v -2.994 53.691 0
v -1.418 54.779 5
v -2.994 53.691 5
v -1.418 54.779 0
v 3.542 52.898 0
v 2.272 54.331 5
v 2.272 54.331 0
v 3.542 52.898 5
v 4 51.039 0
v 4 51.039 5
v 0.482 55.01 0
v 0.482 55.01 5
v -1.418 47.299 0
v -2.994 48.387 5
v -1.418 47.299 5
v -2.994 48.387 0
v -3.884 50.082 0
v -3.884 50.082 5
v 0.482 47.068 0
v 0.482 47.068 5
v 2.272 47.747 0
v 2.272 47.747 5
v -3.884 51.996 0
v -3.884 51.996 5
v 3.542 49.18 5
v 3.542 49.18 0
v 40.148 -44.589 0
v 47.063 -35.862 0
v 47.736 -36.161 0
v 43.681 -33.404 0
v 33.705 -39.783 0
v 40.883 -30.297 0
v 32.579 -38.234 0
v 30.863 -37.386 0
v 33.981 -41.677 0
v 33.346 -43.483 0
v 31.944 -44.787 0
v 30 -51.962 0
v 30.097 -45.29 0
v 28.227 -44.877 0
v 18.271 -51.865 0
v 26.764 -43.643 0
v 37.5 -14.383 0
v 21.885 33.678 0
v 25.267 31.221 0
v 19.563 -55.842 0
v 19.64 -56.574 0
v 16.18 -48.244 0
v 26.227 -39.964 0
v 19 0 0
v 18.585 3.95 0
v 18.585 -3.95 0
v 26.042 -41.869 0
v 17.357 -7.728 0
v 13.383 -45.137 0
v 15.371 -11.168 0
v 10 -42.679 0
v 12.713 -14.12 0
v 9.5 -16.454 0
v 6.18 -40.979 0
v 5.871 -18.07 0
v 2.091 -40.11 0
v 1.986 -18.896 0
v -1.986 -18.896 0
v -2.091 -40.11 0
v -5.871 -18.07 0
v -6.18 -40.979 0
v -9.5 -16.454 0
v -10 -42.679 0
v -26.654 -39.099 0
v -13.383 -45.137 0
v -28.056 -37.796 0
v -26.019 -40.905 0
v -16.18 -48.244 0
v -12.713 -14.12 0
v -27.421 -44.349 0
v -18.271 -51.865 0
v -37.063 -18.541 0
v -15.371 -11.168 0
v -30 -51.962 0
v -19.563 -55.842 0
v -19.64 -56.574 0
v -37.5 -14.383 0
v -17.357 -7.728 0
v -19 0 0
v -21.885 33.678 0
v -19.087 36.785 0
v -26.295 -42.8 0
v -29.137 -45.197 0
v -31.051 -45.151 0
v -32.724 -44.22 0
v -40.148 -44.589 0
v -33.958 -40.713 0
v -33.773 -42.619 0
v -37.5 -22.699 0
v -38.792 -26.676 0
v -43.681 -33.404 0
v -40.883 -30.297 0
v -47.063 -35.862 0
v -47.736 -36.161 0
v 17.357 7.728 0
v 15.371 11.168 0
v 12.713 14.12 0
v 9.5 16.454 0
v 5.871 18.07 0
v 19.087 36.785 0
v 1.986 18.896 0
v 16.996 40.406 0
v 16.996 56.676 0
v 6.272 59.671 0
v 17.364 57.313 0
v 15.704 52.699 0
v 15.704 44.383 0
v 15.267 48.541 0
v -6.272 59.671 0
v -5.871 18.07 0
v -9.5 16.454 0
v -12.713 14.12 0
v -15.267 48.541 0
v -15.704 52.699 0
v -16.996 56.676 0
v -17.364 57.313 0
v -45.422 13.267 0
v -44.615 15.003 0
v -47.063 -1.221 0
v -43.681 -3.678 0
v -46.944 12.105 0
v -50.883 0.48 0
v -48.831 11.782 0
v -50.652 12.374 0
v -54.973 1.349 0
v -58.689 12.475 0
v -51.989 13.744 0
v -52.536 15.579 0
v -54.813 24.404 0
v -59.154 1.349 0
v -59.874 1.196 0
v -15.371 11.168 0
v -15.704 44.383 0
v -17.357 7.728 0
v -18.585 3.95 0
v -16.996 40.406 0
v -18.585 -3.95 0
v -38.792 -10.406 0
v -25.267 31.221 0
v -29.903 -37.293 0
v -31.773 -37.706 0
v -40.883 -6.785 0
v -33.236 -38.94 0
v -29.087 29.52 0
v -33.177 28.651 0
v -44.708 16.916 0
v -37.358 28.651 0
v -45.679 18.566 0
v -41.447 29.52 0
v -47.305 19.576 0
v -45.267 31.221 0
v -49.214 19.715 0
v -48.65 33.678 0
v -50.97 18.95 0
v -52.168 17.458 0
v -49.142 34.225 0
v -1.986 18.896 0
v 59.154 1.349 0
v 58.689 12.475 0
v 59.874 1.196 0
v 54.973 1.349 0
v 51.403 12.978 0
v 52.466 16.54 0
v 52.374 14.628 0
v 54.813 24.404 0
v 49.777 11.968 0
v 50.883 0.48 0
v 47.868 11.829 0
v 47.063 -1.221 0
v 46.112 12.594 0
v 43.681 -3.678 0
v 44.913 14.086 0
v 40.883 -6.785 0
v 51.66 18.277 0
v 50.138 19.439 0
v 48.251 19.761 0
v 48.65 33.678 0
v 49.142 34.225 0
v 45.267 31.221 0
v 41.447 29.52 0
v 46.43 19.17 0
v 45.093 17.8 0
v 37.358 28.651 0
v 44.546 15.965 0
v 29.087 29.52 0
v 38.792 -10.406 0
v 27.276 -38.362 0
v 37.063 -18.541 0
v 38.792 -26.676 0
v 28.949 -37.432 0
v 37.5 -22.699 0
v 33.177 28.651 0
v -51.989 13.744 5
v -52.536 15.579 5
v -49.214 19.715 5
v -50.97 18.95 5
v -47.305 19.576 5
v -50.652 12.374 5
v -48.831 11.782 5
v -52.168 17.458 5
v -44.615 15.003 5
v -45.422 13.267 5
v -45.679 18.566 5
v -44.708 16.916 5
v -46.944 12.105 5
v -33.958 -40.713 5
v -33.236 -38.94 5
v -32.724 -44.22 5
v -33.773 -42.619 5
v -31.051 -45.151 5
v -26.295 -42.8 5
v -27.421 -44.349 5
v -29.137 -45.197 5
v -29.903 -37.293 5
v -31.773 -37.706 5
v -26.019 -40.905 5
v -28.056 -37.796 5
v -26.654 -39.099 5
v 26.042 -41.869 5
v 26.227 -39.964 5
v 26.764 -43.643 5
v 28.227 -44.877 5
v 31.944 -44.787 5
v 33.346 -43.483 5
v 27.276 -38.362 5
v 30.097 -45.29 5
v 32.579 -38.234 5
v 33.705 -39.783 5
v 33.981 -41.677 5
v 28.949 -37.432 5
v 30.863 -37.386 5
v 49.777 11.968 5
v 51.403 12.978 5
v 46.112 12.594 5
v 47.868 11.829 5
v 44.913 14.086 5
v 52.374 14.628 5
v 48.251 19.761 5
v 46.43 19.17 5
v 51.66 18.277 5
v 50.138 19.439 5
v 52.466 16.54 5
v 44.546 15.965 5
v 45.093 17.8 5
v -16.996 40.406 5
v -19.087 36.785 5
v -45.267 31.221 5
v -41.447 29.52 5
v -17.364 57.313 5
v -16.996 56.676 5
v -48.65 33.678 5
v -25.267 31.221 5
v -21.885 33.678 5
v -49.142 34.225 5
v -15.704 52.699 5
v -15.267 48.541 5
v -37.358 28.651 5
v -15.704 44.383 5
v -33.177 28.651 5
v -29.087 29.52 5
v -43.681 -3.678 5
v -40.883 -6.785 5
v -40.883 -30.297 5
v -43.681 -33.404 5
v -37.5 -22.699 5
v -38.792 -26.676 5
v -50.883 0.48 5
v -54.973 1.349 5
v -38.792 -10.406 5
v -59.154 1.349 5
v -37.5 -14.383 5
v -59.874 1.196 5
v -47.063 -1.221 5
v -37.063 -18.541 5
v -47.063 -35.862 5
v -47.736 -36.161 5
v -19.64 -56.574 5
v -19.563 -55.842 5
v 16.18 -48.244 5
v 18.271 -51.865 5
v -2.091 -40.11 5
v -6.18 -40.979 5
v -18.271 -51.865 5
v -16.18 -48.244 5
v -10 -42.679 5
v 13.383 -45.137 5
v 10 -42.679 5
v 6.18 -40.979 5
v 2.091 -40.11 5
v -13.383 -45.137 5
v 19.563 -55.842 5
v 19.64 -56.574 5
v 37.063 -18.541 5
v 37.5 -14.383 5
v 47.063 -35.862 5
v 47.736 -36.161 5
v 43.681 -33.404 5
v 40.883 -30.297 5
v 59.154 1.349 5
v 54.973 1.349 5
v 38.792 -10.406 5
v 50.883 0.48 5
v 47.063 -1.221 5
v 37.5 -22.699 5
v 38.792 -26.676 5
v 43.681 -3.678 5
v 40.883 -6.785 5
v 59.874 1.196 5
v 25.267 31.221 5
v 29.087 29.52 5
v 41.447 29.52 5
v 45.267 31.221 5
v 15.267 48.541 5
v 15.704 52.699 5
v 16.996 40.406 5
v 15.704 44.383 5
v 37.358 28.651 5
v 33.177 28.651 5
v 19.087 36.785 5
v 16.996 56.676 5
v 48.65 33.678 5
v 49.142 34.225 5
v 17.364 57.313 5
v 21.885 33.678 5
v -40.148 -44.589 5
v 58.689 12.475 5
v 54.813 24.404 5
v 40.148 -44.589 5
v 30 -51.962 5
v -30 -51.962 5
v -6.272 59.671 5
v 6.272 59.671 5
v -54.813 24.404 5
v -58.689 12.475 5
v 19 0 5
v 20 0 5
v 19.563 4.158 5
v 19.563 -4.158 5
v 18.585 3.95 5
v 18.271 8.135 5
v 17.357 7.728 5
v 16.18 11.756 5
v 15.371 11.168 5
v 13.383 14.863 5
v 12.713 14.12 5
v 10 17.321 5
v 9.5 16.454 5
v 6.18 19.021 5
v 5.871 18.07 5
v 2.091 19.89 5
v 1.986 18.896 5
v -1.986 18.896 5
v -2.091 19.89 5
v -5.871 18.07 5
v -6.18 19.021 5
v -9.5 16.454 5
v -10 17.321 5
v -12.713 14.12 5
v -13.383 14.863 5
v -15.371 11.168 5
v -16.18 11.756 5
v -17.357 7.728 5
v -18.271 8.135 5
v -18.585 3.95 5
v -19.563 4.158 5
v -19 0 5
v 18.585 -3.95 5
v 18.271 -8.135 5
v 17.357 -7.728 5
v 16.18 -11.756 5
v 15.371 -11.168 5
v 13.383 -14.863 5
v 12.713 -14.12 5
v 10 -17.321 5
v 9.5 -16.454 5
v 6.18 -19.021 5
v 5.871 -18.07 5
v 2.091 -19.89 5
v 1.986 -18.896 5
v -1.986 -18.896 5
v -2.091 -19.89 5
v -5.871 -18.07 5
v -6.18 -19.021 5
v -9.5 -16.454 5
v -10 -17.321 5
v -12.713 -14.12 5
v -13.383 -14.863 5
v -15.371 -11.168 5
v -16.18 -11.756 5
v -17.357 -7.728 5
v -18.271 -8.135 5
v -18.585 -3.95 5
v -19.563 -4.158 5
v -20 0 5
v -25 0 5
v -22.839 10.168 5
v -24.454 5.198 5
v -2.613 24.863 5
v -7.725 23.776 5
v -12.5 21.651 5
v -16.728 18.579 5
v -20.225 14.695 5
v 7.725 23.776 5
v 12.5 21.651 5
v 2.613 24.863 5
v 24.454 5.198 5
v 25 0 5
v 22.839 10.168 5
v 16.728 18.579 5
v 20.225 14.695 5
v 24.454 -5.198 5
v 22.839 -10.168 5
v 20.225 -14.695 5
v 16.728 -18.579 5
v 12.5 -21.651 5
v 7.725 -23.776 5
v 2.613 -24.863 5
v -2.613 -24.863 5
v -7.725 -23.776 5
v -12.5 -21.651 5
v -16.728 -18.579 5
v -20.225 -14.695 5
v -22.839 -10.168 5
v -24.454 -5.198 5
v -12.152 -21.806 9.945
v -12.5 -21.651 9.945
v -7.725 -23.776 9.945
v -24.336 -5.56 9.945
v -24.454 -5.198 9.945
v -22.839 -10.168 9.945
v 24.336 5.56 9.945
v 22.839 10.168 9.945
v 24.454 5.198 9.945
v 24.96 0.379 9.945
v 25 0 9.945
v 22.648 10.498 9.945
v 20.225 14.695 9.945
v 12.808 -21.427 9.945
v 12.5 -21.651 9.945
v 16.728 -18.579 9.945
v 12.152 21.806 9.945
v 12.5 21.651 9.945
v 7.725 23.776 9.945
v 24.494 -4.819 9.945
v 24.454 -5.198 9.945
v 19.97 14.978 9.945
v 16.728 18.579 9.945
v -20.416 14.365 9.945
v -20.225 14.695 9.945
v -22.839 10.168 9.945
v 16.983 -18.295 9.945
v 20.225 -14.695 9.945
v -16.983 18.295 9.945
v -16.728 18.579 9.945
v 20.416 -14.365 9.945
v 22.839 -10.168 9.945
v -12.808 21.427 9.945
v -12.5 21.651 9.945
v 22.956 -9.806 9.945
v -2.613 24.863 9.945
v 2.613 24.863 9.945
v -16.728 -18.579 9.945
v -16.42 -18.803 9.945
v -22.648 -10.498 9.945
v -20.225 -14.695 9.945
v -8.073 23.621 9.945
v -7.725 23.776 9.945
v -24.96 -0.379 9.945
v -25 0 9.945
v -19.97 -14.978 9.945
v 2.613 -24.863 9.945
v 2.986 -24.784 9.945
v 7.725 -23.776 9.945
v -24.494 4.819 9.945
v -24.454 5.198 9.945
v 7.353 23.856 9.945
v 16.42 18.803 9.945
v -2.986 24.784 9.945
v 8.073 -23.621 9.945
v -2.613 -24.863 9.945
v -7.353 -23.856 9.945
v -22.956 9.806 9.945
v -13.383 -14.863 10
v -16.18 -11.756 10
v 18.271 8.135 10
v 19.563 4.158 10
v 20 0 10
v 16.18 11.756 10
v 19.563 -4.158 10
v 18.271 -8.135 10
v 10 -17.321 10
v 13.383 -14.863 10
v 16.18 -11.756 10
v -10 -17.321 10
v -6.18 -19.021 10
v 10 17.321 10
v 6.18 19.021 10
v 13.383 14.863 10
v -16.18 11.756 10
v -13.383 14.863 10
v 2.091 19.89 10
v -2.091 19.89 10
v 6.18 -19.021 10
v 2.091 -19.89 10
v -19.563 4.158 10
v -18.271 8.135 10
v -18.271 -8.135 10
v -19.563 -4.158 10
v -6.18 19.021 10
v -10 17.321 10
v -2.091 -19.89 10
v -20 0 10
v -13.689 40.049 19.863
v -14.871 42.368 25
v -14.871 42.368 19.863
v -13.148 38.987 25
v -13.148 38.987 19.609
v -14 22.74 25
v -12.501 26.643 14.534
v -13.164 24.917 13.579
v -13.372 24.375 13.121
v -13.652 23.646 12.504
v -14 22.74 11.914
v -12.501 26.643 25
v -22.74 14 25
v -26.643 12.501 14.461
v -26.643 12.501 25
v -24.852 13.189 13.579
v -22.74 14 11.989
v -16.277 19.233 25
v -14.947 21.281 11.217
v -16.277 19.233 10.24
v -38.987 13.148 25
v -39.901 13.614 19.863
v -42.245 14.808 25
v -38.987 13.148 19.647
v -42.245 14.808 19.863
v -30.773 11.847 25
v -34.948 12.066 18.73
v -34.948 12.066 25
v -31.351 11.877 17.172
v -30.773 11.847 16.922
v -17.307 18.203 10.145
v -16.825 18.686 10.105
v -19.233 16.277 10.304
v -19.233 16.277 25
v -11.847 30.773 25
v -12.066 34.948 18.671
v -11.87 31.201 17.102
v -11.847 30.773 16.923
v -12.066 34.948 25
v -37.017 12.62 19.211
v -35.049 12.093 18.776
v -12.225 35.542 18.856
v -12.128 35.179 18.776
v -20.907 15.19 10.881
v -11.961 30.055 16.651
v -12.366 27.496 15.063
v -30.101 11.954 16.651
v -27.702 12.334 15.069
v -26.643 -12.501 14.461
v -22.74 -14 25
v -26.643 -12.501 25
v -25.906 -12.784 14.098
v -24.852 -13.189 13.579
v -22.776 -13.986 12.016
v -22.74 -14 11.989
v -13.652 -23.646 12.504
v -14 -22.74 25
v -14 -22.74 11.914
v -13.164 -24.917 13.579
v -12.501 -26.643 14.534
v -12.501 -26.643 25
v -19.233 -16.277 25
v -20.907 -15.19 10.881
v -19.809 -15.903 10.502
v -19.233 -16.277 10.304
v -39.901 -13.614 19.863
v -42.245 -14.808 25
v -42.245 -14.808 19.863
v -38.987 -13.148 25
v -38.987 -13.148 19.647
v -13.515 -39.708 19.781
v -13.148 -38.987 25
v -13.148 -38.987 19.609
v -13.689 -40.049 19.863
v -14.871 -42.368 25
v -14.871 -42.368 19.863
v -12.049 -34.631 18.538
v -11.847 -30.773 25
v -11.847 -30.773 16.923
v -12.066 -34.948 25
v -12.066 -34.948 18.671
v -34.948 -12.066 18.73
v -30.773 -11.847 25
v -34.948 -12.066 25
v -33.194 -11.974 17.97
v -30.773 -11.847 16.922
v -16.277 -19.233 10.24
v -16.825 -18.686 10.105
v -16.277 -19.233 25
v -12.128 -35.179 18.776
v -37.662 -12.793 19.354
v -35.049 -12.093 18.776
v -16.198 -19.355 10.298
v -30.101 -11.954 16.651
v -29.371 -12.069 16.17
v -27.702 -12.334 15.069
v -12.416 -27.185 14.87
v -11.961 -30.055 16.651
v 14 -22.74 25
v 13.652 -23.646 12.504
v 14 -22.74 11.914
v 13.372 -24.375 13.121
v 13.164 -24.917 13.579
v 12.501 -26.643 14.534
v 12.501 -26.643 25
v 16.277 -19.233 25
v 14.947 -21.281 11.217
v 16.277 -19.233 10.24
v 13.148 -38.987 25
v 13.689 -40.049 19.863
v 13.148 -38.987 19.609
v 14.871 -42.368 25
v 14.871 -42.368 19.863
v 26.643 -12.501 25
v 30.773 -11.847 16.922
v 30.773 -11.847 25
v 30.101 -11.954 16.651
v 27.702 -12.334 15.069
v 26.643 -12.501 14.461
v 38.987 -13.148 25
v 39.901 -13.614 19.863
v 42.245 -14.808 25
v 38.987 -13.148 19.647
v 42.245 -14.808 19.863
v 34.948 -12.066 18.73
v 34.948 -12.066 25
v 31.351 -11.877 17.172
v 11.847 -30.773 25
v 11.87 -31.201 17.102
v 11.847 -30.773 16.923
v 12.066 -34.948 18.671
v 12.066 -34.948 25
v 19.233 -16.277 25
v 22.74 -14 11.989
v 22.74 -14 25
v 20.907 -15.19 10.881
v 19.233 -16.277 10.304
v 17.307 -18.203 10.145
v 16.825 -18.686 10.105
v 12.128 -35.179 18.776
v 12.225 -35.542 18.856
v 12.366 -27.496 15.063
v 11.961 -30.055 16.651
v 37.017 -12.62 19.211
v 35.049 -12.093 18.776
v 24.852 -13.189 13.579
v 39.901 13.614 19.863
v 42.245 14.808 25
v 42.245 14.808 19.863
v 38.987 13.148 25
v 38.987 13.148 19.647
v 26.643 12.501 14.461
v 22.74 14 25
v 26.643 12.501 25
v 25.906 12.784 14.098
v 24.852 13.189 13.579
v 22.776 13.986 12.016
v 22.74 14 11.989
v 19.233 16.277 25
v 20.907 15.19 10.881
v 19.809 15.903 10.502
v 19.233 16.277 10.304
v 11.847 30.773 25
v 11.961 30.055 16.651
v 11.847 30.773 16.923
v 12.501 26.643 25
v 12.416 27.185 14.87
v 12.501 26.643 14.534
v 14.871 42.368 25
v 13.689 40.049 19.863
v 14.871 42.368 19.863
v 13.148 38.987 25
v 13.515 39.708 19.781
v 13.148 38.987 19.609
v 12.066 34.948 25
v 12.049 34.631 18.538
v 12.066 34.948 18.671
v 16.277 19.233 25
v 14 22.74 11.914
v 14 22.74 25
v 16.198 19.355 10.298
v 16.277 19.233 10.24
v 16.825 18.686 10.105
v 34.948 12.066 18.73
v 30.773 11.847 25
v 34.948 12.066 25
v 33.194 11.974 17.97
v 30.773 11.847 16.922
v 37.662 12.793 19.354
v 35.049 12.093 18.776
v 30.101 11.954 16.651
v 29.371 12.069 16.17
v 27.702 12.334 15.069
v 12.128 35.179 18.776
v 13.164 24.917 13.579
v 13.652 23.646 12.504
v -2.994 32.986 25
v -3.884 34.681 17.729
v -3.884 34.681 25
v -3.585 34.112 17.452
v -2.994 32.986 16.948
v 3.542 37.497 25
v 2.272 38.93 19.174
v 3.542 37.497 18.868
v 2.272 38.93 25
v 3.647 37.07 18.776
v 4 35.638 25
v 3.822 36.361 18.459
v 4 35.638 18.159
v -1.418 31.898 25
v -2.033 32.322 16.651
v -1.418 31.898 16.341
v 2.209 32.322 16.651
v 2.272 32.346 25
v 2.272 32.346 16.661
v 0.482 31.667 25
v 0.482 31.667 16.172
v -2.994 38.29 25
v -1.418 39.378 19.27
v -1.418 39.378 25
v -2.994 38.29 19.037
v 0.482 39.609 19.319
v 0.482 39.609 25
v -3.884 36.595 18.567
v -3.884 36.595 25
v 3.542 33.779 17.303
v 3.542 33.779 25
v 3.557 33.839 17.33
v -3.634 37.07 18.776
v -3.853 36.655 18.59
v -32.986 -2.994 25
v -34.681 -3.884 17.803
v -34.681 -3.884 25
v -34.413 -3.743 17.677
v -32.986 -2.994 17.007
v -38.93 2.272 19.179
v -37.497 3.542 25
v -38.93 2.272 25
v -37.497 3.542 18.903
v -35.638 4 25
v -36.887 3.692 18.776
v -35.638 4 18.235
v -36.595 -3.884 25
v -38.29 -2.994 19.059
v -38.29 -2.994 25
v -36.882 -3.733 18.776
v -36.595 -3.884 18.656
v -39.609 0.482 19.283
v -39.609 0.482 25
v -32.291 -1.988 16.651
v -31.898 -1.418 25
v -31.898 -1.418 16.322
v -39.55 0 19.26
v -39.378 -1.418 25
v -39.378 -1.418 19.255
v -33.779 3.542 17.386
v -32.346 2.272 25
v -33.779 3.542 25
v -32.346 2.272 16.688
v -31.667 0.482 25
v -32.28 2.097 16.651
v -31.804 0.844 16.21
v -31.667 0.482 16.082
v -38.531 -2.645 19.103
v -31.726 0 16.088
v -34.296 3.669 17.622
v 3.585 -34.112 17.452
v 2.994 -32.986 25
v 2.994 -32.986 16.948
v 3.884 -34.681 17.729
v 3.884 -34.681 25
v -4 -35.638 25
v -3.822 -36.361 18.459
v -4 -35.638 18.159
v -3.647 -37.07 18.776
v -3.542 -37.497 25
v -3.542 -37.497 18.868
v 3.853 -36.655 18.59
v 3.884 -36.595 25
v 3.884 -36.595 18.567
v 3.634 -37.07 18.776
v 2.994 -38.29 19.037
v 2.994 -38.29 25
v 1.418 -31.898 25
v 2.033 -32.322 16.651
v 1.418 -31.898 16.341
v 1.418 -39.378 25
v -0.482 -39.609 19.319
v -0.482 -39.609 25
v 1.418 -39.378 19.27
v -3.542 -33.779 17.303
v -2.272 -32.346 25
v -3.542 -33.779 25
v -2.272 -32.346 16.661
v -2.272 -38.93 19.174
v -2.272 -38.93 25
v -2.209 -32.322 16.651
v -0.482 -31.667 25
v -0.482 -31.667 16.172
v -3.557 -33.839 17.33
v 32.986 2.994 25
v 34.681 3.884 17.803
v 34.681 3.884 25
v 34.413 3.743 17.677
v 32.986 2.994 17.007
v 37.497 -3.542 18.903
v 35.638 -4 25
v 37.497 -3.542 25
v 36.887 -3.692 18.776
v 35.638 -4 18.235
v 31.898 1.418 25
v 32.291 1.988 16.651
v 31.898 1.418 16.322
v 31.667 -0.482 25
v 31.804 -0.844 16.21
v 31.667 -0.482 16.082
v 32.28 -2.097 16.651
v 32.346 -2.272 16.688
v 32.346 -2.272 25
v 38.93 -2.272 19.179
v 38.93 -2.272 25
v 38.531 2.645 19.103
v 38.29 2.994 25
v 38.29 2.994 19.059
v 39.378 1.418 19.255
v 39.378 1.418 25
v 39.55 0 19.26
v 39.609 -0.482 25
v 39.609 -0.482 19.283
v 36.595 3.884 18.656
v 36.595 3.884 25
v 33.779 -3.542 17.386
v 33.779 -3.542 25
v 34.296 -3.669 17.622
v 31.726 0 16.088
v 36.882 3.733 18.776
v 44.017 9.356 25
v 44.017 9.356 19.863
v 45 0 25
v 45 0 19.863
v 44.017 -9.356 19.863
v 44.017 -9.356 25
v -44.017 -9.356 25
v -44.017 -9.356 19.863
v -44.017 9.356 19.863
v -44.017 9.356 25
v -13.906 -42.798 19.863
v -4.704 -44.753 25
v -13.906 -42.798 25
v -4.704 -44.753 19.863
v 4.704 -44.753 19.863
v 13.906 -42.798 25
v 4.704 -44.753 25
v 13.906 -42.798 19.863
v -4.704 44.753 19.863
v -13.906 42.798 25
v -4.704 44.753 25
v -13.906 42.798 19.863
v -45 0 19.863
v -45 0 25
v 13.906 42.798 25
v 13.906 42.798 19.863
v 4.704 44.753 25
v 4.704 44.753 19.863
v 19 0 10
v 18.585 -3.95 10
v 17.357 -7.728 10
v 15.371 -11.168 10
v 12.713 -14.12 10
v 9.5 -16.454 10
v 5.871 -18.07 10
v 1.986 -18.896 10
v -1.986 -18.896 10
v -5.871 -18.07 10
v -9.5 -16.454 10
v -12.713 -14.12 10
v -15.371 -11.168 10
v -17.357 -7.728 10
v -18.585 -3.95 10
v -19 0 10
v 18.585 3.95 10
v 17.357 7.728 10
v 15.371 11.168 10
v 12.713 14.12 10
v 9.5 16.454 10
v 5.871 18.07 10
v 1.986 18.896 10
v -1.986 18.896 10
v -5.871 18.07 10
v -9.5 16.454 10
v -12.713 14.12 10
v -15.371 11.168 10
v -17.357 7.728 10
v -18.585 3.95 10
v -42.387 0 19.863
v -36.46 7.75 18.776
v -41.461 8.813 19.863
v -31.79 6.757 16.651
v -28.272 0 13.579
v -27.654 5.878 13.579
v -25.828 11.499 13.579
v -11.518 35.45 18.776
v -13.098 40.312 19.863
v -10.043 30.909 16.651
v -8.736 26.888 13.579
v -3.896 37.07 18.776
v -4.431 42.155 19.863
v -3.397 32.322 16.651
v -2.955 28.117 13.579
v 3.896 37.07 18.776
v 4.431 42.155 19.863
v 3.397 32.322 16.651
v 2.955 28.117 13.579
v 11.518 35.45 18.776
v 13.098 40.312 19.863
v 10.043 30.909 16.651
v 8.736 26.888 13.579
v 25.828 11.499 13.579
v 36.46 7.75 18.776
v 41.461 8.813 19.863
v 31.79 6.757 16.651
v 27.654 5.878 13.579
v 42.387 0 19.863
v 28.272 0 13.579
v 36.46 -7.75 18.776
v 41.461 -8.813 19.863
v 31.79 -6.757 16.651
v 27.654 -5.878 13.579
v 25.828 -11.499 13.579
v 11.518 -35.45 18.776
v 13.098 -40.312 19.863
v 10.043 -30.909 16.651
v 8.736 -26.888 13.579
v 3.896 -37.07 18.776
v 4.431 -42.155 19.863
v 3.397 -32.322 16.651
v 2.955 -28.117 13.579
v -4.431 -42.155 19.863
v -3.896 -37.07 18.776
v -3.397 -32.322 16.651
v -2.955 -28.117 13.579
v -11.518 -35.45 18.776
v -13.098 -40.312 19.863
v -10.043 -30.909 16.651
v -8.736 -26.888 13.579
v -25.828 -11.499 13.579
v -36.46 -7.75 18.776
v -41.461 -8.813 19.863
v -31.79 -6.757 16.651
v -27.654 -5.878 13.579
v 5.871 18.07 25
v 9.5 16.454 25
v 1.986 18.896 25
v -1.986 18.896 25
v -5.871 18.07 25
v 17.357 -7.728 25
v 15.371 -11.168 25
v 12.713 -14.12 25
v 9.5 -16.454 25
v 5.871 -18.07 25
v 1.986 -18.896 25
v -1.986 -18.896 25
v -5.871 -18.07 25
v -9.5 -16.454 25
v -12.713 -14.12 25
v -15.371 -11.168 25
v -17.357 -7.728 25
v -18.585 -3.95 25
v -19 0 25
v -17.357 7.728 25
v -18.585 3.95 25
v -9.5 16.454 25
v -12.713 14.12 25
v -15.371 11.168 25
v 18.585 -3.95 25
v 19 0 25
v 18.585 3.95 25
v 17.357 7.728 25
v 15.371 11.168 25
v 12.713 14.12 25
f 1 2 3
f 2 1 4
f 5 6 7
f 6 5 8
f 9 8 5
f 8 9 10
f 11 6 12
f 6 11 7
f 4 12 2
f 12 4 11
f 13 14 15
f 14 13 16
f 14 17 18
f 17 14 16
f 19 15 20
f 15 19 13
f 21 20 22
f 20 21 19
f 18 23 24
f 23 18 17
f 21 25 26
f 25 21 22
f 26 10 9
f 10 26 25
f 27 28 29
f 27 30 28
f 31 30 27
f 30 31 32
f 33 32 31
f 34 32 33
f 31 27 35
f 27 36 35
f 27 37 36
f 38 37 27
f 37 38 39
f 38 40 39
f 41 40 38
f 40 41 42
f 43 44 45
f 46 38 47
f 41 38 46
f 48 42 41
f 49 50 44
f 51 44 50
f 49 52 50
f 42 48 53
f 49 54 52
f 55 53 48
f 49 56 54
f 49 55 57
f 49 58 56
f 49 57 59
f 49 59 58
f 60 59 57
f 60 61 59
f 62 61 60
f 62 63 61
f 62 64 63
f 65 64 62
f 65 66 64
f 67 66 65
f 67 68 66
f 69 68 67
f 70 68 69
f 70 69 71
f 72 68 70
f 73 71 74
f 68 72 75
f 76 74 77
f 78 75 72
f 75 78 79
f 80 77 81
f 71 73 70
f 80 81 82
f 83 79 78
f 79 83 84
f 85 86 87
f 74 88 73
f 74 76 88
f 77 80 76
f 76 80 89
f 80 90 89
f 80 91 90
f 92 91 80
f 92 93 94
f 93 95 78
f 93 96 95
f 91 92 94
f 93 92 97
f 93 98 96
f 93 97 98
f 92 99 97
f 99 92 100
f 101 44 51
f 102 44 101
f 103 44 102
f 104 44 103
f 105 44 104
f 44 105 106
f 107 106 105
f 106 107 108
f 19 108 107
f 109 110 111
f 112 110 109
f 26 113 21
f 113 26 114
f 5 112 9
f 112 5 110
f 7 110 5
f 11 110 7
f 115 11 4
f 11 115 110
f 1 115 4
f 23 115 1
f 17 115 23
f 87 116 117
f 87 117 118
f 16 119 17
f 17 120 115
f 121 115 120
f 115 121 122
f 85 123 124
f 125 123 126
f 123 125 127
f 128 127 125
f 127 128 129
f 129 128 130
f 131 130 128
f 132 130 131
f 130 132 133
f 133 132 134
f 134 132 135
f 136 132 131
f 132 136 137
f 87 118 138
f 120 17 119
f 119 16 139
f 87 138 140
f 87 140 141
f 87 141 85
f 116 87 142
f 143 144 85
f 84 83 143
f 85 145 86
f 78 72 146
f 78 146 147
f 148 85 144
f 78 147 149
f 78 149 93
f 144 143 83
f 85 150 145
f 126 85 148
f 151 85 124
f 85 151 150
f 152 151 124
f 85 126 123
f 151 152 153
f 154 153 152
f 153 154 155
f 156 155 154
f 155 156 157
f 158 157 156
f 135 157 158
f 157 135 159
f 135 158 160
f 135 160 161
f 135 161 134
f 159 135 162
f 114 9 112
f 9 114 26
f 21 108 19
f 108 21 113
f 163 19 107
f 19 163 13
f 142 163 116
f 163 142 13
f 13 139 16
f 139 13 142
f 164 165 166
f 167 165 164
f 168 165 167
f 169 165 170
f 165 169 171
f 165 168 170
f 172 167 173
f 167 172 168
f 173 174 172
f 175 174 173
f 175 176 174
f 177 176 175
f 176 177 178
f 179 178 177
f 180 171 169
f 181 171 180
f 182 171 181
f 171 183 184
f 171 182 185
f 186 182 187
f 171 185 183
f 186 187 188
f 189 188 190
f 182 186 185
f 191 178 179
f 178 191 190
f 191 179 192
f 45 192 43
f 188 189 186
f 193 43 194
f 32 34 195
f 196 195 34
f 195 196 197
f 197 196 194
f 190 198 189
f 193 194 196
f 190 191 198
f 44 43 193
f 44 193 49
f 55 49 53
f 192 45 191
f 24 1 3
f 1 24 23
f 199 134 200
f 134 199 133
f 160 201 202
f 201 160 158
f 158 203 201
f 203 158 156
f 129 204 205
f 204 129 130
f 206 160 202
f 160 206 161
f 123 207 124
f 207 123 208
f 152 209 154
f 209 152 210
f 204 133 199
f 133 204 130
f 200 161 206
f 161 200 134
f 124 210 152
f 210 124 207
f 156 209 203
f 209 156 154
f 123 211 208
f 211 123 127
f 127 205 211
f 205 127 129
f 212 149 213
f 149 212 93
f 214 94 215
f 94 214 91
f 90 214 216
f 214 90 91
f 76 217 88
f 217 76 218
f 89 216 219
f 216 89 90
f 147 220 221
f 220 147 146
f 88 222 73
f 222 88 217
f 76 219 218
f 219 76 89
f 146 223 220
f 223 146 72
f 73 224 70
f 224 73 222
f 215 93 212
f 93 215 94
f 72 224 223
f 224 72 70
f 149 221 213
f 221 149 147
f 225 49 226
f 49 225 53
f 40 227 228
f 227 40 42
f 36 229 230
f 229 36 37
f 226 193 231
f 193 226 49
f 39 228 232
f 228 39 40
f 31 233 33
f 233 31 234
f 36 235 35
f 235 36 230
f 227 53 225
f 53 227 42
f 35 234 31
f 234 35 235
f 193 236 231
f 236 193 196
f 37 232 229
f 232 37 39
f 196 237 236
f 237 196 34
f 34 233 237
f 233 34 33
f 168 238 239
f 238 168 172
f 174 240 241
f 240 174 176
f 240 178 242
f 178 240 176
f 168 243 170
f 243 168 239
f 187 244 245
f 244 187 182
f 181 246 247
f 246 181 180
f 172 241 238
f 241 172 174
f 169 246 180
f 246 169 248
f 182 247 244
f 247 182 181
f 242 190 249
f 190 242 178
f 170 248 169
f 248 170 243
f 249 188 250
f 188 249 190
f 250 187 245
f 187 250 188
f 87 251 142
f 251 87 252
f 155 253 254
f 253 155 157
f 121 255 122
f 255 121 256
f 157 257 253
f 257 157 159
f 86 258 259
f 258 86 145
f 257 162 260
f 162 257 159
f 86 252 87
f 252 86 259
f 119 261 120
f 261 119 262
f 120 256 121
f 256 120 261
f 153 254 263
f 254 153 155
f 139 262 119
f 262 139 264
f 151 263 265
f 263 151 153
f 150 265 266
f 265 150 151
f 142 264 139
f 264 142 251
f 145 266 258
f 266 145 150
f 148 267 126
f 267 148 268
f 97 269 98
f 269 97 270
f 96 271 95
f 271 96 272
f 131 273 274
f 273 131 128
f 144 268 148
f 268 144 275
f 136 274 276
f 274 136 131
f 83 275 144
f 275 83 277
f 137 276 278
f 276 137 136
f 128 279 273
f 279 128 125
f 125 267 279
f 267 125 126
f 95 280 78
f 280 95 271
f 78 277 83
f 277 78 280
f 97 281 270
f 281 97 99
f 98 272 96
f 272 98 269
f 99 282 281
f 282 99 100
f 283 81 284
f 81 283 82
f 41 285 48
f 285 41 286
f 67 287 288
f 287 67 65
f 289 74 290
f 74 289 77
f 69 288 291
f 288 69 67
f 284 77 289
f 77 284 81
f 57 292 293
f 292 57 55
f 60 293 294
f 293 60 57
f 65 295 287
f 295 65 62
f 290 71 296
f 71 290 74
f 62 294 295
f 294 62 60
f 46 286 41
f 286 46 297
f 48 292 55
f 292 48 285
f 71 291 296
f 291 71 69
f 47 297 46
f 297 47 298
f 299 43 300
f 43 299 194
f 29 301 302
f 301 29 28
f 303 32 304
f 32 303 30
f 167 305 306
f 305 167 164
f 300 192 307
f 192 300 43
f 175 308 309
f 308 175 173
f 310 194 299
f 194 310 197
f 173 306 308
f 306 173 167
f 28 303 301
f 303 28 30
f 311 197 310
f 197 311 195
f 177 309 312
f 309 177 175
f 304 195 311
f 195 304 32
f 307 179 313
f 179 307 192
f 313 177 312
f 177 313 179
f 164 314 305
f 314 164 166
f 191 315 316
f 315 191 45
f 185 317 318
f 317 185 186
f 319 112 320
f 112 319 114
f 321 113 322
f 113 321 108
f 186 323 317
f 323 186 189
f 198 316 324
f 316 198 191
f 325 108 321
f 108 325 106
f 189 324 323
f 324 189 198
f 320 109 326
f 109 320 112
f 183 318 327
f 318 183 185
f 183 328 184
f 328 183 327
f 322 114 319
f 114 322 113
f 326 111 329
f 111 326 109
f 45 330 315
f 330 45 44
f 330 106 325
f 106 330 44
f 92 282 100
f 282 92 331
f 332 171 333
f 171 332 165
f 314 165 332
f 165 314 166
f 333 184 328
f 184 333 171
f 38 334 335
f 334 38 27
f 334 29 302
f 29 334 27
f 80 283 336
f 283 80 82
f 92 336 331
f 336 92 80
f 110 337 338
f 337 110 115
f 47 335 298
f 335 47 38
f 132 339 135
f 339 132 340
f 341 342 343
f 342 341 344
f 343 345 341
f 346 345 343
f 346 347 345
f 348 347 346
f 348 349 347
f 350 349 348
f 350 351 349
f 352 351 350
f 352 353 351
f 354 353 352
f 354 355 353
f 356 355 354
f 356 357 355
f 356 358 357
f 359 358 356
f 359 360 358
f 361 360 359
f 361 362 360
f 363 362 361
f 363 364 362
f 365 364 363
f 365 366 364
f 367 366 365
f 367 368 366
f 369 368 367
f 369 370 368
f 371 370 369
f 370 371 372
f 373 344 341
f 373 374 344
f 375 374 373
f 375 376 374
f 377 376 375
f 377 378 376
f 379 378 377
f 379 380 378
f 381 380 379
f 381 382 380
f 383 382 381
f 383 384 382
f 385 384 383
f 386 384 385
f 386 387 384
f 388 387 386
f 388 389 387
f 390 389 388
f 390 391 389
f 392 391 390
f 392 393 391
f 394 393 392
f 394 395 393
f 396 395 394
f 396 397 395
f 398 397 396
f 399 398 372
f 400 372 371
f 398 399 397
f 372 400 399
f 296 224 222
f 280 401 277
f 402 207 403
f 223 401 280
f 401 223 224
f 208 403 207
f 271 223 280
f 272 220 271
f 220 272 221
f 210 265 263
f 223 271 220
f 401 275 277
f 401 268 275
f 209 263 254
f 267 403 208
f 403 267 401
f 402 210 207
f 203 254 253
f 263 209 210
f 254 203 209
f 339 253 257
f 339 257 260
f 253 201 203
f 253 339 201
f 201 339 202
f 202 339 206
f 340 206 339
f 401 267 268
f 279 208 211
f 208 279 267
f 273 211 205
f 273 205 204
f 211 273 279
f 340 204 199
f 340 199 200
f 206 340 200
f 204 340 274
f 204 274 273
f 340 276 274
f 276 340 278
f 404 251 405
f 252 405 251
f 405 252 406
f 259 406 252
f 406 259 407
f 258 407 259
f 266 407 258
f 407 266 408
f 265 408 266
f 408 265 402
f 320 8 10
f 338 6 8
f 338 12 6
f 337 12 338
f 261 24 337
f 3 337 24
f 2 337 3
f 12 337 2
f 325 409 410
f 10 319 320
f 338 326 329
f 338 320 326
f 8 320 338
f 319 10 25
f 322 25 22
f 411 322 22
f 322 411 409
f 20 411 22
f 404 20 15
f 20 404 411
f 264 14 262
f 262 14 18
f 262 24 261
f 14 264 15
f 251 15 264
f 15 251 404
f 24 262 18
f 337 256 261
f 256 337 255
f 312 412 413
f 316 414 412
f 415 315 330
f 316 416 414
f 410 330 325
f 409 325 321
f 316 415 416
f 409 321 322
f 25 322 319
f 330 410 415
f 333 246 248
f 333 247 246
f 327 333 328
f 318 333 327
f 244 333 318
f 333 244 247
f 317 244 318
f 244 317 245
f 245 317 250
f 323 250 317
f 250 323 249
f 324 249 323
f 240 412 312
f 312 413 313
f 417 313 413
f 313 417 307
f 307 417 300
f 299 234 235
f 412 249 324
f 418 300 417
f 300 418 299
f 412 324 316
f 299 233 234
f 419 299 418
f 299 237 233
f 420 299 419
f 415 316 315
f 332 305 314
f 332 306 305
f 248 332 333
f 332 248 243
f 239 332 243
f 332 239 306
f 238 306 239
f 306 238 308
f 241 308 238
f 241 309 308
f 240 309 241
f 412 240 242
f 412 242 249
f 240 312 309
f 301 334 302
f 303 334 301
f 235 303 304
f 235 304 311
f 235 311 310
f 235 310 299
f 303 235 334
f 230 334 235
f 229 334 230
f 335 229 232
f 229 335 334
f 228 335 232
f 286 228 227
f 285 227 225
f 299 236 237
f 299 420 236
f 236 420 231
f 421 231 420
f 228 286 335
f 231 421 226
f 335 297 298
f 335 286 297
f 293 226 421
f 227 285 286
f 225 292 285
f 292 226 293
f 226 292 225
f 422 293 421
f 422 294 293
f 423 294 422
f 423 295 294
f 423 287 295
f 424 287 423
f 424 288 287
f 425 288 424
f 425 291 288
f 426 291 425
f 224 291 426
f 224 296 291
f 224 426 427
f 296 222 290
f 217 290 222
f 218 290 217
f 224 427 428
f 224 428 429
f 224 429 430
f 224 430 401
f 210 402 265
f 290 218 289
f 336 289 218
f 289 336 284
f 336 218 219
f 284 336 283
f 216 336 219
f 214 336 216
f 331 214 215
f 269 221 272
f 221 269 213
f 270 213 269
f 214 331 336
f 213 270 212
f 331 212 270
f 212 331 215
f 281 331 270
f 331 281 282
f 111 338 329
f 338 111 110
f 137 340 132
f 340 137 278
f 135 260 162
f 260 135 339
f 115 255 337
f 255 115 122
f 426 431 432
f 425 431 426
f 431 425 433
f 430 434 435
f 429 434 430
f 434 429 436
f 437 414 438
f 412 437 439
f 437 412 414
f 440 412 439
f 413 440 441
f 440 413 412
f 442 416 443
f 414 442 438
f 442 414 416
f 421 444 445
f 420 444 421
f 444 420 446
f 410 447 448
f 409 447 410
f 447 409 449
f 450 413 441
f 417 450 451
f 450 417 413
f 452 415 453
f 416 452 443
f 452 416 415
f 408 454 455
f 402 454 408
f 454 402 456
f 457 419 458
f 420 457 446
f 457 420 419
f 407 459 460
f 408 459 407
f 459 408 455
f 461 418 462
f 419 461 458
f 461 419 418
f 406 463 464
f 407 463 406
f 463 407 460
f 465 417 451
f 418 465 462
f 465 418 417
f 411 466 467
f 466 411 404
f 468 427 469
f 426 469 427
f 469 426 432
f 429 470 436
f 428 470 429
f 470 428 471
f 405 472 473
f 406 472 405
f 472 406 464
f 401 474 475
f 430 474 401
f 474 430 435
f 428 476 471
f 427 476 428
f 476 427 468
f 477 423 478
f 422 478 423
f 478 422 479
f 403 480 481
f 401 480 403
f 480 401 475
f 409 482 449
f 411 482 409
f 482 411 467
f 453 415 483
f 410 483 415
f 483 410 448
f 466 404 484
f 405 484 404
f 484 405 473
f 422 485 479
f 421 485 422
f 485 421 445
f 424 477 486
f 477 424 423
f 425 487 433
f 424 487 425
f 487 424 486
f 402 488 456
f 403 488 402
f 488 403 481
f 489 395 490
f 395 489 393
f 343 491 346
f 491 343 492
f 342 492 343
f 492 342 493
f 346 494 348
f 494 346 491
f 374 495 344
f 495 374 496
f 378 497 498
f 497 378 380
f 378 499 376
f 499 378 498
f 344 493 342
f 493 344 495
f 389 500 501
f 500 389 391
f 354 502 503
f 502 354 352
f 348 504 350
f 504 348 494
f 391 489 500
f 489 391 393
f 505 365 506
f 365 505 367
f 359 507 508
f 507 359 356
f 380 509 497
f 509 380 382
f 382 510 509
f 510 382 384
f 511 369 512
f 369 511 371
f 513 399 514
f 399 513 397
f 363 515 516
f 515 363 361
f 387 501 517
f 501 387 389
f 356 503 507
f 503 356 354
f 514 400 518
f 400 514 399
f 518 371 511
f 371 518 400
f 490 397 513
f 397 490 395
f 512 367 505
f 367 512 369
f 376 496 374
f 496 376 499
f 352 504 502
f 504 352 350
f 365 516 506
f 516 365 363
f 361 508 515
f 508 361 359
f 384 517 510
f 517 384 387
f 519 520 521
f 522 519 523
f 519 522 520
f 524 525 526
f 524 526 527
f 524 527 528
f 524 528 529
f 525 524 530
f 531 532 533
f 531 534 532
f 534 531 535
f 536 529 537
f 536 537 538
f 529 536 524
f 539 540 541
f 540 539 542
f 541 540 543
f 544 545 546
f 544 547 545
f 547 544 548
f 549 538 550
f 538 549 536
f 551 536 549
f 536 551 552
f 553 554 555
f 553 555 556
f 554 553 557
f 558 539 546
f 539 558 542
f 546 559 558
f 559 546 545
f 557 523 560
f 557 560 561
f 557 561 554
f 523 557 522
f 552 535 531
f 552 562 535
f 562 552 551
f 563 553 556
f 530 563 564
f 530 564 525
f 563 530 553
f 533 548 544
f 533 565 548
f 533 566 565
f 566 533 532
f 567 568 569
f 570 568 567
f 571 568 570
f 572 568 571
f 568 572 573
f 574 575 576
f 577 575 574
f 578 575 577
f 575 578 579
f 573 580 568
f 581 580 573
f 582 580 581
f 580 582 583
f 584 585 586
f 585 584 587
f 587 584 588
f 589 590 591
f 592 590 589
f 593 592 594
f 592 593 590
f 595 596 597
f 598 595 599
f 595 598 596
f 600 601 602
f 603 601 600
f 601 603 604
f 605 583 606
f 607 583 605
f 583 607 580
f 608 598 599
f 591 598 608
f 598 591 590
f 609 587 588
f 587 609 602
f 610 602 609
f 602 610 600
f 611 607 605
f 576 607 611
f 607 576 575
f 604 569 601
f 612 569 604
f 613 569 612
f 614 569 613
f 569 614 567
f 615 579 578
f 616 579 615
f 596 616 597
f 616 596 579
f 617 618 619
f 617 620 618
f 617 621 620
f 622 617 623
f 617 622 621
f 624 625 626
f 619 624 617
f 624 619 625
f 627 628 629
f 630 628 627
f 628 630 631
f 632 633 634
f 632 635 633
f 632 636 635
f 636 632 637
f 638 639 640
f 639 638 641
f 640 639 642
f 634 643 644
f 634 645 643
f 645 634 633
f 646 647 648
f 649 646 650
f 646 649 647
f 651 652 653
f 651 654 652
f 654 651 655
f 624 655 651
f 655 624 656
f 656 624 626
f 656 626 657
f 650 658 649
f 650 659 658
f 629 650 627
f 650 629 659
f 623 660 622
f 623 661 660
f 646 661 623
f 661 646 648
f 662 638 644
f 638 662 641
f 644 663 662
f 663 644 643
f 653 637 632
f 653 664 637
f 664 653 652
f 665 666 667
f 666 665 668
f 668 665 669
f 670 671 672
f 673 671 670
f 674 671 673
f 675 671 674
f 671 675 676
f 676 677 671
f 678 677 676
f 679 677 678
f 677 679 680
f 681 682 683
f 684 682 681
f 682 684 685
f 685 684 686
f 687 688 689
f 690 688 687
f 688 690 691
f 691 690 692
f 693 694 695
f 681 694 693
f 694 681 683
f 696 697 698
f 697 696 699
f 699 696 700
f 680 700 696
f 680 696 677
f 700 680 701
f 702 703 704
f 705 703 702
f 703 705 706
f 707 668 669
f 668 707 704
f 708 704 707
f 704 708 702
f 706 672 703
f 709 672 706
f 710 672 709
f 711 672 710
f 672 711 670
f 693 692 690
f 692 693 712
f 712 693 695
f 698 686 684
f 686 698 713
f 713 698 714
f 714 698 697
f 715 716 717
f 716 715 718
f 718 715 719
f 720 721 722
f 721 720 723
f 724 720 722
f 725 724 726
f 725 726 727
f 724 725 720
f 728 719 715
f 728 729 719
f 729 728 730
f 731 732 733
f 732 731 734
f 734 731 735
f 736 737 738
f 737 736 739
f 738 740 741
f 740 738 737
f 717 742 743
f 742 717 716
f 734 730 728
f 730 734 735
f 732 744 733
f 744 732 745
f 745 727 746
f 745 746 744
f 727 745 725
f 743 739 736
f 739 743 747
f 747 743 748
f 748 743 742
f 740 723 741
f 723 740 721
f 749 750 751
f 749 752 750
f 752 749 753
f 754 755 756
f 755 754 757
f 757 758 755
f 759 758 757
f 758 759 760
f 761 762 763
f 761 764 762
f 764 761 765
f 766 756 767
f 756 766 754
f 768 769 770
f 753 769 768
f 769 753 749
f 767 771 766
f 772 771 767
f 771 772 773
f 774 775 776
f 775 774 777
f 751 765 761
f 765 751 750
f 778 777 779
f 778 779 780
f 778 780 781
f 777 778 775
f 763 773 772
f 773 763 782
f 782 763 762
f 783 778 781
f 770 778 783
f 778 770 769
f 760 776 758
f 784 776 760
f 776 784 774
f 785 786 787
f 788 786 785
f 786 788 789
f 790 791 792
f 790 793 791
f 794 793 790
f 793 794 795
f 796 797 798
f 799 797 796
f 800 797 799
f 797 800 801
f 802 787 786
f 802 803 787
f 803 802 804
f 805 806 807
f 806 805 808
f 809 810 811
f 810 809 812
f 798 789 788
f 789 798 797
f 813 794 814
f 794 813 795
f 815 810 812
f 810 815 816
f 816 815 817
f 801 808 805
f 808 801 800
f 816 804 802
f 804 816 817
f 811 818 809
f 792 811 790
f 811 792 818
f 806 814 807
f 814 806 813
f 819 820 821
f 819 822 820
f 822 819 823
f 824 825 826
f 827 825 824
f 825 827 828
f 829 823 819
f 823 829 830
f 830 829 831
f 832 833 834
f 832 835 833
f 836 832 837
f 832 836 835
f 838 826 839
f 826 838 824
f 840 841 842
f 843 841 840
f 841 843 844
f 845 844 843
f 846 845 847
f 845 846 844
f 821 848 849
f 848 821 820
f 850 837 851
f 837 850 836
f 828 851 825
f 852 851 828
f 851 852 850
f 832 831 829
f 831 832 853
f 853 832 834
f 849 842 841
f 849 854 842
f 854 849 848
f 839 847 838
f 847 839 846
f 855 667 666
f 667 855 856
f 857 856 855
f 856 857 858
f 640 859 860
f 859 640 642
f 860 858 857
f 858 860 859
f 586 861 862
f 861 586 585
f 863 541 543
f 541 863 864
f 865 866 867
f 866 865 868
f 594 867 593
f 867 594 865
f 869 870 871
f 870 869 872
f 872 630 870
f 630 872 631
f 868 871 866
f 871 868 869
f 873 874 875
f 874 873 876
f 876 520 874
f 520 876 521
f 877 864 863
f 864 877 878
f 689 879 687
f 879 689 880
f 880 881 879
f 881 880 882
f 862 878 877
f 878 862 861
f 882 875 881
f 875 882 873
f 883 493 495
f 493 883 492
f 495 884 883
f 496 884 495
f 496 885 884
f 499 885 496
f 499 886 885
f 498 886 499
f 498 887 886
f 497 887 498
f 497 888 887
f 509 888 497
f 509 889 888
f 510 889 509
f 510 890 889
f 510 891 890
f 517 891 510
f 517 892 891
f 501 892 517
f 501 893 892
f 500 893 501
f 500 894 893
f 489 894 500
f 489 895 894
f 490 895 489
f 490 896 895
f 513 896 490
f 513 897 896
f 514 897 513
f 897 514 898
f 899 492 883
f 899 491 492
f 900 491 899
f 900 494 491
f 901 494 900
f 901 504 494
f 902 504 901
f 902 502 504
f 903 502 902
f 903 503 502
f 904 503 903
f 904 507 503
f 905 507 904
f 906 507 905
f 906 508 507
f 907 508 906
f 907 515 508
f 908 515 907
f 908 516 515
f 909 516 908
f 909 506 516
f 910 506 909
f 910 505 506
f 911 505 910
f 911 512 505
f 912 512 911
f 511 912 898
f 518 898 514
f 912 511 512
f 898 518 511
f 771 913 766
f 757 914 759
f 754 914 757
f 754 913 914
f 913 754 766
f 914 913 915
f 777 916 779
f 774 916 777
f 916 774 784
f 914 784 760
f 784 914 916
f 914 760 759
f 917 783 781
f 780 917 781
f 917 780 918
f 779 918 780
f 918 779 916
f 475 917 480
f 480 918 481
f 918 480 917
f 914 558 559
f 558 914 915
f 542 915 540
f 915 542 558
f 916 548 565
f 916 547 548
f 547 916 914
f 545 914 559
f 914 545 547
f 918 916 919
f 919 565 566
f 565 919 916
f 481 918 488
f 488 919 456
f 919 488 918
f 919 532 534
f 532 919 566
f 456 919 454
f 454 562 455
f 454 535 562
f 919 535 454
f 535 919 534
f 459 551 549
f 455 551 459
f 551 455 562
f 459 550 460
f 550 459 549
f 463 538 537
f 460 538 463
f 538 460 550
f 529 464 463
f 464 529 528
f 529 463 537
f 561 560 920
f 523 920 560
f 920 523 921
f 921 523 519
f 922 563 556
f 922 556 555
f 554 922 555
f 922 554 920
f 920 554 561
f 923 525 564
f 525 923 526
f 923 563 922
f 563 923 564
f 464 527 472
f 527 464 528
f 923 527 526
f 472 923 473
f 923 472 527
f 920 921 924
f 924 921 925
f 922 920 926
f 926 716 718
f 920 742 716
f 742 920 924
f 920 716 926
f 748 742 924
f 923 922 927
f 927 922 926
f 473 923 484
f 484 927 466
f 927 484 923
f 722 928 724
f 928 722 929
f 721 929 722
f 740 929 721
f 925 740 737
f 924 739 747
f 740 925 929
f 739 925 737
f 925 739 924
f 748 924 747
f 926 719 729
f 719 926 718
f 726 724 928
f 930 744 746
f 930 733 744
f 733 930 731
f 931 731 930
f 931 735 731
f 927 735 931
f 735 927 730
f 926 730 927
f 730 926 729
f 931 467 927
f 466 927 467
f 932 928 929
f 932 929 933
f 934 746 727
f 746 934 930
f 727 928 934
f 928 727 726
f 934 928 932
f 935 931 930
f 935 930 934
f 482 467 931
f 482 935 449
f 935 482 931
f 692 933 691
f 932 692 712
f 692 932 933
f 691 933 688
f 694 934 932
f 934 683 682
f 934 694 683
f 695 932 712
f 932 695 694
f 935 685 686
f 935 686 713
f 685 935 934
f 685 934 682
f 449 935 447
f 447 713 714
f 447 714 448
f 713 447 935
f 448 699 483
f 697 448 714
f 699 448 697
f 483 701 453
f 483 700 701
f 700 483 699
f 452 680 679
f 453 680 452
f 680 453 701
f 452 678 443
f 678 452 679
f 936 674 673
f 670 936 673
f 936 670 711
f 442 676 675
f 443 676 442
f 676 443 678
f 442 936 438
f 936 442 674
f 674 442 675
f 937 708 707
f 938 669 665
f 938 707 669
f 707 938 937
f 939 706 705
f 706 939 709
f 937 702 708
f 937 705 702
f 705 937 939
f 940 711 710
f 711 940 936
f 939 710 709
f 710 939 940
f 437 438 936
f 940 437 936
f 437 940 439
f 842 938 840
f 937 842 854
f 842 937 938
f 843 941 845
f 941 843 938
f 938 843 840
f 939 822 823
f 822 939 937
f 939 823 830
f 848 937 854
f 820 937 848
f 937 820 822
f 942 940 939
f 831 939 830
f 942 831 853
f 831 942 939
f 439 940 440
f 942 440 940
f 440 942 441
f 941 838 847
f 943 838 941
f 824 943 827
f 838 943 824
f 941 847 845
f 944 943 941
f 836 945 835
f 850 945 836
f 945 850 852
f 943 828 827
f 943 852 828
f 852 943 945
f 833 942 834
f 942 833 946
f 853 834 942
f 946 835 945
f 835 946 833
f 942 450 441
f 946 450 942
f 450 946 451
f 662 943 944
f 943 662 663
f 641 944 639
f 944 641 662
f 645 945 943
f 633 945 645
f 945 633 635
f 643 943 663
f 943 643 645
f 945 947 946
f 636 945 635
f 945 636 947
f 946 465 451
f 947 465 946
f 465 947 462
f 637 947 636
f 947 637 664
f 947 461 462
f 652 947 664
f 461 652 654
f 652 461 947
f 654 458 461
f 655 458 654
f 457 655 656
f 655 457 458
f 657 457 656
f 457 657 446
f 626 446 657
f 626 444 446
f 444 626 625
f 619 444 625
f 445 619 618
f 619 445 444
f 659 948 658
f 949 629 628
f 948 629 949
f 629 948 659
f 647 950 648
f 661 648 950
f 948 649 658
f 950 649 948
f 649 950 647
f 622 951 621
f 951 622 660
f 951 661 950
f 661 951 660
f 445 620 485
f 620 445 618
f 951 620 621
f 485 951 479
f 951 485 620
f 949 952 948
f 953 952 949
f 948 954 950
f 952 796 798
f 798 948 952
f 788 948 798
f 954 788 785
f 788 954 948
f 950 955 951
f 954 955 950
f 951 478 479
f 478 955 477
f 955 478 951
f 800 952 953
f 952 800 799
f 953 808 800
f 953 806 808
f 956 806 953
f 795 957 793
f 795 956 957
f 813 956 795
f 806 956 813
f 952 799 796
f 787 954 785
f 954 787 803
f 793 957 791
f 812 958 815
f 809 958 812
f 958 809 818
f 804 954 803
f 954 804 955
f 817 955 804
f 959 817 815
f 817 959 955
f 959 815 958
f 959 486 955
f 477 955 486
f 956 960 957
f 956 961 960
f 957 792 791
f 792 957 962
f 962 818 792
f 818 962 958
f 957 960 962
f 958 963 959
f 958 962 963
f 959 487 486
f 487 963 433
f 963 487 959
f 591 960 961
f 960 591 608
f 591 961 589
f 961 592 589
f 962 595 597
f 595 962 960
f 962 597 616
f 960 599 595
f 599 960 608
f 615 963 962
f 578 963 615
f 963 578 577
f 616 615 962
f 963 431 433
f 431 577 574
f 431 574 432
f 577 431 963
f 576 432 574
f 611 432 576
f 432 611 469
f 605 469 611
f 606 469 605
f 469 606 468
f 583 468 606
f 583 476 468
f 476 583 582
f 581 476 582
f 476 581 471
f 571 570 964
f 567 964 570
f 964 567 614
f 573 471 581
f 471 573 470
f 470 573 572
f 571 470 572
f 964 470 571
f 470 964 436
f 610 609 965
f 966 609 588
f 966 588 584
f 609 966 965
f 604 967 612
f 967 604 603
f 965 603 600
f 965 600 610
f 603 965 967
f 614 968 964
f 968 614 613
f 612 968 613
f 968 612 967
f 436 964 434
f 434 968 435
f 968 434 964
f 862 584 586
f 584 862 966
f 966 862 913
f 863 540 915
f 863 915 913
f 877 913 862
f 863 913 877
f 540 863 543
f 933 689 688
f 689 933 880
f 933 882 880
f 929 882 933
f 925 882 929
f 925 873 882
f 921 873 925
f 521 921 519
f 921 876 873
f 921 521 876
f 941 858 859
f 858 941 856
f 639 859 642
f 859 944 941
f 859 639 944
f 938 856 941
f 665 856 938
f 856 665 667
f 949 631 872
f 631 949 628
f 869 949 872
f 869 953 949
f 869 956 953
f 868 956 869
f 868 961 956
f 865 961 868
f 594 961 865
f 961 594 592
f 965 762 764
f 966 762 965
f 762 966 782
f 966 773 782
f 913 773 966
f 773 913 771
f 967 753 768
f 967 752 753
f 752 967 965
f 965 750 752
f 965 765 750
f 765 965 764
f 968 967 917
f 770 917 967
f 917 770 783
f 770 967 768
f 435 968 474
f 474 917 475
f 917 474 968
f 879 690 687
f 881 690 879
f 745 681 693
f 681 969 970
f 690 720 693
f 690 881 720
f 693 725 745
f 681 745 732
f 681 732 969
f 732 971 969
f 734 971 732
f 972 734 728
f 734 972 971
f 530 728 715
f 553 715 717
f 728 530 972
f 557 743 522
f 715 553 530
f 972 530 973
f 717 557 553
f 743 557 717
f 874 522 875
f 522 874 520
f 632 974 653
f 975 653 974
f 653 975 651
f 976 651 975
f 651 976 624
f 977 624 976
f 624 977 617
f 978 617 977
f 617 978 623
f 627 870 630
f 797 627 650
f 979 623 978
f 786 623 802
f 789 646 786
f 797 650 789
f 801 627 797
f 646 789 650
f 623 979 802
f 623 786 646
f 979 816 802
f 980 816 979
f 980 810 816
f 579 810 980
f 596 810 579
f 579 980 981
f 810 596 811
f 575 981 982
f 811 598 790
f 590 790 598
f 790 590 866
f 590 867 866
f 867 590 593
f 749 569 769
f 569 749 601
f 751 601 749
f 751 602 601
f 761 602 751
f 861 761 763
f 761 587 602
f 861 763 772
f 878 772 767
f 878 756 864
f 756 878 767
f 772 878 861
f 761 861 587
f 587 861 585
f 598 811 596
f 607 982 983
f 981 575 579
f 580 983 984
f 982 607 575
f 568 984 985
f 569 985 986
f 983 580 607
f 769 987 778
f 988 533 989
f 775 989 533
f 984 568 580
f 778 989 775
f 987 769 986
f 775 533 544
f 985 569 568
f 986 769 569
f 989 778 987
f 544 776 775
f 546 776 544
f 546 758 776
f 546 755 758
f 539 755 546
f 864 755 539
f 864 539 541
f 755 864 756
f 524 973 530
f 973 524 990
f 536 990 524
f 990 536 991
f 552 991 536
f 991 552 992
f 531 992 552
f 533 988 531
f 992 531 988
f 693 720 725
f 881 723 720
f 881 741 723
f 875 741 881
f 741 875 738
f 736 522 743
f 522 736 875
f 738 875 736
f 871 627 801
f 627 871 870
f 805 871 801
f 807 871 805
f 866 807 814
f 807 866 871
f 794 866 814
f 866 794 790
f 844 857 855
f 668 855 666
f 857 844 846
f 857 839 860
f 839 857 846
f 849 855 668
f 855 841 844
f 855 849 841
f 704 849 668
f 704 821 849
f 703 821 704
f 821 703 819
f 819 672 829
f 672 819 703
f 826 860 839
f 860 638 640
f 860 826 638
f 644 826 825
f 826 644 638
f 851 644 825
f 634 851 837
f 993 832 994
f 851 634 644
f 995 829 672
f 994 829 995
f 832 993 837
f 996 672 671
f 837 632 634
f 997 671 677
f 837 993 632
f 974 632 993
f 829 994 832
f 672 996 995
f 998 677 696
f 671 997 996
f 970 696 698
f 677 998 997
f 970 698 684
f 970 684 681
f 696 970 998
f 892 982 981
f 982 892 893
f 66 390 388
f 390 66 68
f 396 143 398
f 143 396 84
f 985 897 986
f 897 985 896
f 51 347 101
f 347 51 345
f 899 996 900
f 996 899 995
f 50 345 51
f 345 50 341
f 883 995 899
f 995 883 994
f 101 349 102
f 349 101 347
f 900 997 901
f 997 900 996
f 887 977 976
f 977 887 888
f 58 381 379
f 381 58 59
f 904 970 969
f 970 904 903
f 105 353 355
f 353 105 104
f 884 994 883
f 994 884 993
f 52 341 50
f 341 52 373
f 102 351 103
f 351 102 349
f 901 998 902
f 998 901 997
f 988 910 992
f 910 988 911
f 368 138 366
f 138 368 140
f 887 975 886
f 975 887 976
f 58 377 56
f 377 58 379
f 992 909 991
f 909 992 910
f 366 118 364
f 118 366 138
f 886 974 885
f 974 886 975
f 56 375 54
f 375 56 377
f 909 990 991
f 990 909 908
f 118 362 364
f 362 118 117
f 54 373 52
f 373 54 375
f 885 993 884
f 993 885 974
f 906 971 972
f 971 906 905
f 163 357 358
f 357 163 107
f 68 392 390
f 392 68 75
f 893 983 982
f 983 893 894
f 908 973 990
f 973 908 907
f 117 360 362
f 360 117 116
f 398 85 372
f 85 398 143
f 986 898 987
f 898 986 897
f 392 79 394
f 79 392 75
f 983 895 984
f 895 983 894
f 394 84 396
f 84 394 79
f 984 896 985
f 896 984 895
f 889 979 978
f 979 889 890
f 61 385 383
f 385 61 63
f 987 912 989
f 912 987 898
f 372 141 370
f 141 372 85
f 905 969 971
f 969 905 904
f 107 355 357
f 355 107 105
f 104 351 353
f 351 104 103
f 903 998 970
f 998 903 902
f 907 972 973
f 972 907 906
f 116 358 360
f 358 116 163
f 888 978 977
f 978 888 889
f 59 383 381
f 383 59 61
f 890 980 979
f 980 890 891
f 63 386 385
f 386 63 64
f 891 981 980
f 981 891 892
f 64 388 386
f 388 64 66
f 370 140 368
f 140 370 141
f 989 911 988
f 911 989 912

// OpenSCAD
base_radius=60;
base_height=5;
hub_bolt_radius=51.039;
riser_height=15;
riser_outer_radius=25;
riser_inner_radius=20;
bearing_diameter=38;
top_height=5;
top_radius=45;
top_bolt_radius=35.638;
fillet_radius=25;
//$fn=100;

module base_plate(){
    difference(){
        cylinder(h=base_height, r=base_radius);
        rotary_holes(5, hub_bolt_radius, 8);
        base_plate_cutout();
    }
}

module base_plate_cutout(){
    rotate(360/10)
        rotary_holes(5, base_radius, 40);
}

module riser(){
    translate([0, 0, base_height])
        difference(){
            cylinder(h=riser_height,r=riser_outer_radius);
            cylinder(h=riser_height,r=riser_inner_radius);
        }
}

module top_plate(){
    translate([0,0,base_height+riser_height]){
        difference(){
            top_disc_with_fillet();
            top_plate_bolt_holes();
            top_plate_cutout();
        }
    }
}

module top_plate_bolt_holes(){
    rotary_holes(4, top_bolt_radius, 8);
}

module top_plate_cutout(){
    rotate(360/8)
        rotary_holes(4, top_radius, 40);
}

module top_disc_with_fillet(){
    cylinder(h=top_height, r=top_radius);
    translate([0,0,-riser_height]){
        top_plate_fillet();
    }
}

module rotary_holes(n, radius, hole_diameter){
    for (i = [0:n]) {
        rotate(i*360/n)
            translate([0,radius,0])
                cylinder(h=100, d=hole_diameter);
    }
}

module top_plate_fillet(){
    //need to add cylinder with subtracted torus to create underhang fillet
    translate([0,0,-(fillet_radius-riser_height)])
        difference(){
            translate([0,0,fillet_radius-riser_height])
                cylinder(h=riser_height,r=top_radius);
            cylinder(h=riser_height,r=riser_outer_radius);
            rotate_extrude()
                translate([top_radius,0,0])
                    circle(r=fillet_radius);
            top_plate_cutout();
            top_plate_bolt_holes();
        }
}

module full_adapter(){
    difference(){
        union(){
            base_plate();
            riser();
            top_plate();
        }
        cylinder(h=base_height+riser_height+top_height, d=bearing_diameter);
    }
}

module base_test(){
    difference(){
        union(){
            base_plate();
        }
        cylinder(h=base_height+riser_height+top_height, d=bearing_diameter);
    }
}

full_adapter();
//base_test();
//top_plate_fillet();
